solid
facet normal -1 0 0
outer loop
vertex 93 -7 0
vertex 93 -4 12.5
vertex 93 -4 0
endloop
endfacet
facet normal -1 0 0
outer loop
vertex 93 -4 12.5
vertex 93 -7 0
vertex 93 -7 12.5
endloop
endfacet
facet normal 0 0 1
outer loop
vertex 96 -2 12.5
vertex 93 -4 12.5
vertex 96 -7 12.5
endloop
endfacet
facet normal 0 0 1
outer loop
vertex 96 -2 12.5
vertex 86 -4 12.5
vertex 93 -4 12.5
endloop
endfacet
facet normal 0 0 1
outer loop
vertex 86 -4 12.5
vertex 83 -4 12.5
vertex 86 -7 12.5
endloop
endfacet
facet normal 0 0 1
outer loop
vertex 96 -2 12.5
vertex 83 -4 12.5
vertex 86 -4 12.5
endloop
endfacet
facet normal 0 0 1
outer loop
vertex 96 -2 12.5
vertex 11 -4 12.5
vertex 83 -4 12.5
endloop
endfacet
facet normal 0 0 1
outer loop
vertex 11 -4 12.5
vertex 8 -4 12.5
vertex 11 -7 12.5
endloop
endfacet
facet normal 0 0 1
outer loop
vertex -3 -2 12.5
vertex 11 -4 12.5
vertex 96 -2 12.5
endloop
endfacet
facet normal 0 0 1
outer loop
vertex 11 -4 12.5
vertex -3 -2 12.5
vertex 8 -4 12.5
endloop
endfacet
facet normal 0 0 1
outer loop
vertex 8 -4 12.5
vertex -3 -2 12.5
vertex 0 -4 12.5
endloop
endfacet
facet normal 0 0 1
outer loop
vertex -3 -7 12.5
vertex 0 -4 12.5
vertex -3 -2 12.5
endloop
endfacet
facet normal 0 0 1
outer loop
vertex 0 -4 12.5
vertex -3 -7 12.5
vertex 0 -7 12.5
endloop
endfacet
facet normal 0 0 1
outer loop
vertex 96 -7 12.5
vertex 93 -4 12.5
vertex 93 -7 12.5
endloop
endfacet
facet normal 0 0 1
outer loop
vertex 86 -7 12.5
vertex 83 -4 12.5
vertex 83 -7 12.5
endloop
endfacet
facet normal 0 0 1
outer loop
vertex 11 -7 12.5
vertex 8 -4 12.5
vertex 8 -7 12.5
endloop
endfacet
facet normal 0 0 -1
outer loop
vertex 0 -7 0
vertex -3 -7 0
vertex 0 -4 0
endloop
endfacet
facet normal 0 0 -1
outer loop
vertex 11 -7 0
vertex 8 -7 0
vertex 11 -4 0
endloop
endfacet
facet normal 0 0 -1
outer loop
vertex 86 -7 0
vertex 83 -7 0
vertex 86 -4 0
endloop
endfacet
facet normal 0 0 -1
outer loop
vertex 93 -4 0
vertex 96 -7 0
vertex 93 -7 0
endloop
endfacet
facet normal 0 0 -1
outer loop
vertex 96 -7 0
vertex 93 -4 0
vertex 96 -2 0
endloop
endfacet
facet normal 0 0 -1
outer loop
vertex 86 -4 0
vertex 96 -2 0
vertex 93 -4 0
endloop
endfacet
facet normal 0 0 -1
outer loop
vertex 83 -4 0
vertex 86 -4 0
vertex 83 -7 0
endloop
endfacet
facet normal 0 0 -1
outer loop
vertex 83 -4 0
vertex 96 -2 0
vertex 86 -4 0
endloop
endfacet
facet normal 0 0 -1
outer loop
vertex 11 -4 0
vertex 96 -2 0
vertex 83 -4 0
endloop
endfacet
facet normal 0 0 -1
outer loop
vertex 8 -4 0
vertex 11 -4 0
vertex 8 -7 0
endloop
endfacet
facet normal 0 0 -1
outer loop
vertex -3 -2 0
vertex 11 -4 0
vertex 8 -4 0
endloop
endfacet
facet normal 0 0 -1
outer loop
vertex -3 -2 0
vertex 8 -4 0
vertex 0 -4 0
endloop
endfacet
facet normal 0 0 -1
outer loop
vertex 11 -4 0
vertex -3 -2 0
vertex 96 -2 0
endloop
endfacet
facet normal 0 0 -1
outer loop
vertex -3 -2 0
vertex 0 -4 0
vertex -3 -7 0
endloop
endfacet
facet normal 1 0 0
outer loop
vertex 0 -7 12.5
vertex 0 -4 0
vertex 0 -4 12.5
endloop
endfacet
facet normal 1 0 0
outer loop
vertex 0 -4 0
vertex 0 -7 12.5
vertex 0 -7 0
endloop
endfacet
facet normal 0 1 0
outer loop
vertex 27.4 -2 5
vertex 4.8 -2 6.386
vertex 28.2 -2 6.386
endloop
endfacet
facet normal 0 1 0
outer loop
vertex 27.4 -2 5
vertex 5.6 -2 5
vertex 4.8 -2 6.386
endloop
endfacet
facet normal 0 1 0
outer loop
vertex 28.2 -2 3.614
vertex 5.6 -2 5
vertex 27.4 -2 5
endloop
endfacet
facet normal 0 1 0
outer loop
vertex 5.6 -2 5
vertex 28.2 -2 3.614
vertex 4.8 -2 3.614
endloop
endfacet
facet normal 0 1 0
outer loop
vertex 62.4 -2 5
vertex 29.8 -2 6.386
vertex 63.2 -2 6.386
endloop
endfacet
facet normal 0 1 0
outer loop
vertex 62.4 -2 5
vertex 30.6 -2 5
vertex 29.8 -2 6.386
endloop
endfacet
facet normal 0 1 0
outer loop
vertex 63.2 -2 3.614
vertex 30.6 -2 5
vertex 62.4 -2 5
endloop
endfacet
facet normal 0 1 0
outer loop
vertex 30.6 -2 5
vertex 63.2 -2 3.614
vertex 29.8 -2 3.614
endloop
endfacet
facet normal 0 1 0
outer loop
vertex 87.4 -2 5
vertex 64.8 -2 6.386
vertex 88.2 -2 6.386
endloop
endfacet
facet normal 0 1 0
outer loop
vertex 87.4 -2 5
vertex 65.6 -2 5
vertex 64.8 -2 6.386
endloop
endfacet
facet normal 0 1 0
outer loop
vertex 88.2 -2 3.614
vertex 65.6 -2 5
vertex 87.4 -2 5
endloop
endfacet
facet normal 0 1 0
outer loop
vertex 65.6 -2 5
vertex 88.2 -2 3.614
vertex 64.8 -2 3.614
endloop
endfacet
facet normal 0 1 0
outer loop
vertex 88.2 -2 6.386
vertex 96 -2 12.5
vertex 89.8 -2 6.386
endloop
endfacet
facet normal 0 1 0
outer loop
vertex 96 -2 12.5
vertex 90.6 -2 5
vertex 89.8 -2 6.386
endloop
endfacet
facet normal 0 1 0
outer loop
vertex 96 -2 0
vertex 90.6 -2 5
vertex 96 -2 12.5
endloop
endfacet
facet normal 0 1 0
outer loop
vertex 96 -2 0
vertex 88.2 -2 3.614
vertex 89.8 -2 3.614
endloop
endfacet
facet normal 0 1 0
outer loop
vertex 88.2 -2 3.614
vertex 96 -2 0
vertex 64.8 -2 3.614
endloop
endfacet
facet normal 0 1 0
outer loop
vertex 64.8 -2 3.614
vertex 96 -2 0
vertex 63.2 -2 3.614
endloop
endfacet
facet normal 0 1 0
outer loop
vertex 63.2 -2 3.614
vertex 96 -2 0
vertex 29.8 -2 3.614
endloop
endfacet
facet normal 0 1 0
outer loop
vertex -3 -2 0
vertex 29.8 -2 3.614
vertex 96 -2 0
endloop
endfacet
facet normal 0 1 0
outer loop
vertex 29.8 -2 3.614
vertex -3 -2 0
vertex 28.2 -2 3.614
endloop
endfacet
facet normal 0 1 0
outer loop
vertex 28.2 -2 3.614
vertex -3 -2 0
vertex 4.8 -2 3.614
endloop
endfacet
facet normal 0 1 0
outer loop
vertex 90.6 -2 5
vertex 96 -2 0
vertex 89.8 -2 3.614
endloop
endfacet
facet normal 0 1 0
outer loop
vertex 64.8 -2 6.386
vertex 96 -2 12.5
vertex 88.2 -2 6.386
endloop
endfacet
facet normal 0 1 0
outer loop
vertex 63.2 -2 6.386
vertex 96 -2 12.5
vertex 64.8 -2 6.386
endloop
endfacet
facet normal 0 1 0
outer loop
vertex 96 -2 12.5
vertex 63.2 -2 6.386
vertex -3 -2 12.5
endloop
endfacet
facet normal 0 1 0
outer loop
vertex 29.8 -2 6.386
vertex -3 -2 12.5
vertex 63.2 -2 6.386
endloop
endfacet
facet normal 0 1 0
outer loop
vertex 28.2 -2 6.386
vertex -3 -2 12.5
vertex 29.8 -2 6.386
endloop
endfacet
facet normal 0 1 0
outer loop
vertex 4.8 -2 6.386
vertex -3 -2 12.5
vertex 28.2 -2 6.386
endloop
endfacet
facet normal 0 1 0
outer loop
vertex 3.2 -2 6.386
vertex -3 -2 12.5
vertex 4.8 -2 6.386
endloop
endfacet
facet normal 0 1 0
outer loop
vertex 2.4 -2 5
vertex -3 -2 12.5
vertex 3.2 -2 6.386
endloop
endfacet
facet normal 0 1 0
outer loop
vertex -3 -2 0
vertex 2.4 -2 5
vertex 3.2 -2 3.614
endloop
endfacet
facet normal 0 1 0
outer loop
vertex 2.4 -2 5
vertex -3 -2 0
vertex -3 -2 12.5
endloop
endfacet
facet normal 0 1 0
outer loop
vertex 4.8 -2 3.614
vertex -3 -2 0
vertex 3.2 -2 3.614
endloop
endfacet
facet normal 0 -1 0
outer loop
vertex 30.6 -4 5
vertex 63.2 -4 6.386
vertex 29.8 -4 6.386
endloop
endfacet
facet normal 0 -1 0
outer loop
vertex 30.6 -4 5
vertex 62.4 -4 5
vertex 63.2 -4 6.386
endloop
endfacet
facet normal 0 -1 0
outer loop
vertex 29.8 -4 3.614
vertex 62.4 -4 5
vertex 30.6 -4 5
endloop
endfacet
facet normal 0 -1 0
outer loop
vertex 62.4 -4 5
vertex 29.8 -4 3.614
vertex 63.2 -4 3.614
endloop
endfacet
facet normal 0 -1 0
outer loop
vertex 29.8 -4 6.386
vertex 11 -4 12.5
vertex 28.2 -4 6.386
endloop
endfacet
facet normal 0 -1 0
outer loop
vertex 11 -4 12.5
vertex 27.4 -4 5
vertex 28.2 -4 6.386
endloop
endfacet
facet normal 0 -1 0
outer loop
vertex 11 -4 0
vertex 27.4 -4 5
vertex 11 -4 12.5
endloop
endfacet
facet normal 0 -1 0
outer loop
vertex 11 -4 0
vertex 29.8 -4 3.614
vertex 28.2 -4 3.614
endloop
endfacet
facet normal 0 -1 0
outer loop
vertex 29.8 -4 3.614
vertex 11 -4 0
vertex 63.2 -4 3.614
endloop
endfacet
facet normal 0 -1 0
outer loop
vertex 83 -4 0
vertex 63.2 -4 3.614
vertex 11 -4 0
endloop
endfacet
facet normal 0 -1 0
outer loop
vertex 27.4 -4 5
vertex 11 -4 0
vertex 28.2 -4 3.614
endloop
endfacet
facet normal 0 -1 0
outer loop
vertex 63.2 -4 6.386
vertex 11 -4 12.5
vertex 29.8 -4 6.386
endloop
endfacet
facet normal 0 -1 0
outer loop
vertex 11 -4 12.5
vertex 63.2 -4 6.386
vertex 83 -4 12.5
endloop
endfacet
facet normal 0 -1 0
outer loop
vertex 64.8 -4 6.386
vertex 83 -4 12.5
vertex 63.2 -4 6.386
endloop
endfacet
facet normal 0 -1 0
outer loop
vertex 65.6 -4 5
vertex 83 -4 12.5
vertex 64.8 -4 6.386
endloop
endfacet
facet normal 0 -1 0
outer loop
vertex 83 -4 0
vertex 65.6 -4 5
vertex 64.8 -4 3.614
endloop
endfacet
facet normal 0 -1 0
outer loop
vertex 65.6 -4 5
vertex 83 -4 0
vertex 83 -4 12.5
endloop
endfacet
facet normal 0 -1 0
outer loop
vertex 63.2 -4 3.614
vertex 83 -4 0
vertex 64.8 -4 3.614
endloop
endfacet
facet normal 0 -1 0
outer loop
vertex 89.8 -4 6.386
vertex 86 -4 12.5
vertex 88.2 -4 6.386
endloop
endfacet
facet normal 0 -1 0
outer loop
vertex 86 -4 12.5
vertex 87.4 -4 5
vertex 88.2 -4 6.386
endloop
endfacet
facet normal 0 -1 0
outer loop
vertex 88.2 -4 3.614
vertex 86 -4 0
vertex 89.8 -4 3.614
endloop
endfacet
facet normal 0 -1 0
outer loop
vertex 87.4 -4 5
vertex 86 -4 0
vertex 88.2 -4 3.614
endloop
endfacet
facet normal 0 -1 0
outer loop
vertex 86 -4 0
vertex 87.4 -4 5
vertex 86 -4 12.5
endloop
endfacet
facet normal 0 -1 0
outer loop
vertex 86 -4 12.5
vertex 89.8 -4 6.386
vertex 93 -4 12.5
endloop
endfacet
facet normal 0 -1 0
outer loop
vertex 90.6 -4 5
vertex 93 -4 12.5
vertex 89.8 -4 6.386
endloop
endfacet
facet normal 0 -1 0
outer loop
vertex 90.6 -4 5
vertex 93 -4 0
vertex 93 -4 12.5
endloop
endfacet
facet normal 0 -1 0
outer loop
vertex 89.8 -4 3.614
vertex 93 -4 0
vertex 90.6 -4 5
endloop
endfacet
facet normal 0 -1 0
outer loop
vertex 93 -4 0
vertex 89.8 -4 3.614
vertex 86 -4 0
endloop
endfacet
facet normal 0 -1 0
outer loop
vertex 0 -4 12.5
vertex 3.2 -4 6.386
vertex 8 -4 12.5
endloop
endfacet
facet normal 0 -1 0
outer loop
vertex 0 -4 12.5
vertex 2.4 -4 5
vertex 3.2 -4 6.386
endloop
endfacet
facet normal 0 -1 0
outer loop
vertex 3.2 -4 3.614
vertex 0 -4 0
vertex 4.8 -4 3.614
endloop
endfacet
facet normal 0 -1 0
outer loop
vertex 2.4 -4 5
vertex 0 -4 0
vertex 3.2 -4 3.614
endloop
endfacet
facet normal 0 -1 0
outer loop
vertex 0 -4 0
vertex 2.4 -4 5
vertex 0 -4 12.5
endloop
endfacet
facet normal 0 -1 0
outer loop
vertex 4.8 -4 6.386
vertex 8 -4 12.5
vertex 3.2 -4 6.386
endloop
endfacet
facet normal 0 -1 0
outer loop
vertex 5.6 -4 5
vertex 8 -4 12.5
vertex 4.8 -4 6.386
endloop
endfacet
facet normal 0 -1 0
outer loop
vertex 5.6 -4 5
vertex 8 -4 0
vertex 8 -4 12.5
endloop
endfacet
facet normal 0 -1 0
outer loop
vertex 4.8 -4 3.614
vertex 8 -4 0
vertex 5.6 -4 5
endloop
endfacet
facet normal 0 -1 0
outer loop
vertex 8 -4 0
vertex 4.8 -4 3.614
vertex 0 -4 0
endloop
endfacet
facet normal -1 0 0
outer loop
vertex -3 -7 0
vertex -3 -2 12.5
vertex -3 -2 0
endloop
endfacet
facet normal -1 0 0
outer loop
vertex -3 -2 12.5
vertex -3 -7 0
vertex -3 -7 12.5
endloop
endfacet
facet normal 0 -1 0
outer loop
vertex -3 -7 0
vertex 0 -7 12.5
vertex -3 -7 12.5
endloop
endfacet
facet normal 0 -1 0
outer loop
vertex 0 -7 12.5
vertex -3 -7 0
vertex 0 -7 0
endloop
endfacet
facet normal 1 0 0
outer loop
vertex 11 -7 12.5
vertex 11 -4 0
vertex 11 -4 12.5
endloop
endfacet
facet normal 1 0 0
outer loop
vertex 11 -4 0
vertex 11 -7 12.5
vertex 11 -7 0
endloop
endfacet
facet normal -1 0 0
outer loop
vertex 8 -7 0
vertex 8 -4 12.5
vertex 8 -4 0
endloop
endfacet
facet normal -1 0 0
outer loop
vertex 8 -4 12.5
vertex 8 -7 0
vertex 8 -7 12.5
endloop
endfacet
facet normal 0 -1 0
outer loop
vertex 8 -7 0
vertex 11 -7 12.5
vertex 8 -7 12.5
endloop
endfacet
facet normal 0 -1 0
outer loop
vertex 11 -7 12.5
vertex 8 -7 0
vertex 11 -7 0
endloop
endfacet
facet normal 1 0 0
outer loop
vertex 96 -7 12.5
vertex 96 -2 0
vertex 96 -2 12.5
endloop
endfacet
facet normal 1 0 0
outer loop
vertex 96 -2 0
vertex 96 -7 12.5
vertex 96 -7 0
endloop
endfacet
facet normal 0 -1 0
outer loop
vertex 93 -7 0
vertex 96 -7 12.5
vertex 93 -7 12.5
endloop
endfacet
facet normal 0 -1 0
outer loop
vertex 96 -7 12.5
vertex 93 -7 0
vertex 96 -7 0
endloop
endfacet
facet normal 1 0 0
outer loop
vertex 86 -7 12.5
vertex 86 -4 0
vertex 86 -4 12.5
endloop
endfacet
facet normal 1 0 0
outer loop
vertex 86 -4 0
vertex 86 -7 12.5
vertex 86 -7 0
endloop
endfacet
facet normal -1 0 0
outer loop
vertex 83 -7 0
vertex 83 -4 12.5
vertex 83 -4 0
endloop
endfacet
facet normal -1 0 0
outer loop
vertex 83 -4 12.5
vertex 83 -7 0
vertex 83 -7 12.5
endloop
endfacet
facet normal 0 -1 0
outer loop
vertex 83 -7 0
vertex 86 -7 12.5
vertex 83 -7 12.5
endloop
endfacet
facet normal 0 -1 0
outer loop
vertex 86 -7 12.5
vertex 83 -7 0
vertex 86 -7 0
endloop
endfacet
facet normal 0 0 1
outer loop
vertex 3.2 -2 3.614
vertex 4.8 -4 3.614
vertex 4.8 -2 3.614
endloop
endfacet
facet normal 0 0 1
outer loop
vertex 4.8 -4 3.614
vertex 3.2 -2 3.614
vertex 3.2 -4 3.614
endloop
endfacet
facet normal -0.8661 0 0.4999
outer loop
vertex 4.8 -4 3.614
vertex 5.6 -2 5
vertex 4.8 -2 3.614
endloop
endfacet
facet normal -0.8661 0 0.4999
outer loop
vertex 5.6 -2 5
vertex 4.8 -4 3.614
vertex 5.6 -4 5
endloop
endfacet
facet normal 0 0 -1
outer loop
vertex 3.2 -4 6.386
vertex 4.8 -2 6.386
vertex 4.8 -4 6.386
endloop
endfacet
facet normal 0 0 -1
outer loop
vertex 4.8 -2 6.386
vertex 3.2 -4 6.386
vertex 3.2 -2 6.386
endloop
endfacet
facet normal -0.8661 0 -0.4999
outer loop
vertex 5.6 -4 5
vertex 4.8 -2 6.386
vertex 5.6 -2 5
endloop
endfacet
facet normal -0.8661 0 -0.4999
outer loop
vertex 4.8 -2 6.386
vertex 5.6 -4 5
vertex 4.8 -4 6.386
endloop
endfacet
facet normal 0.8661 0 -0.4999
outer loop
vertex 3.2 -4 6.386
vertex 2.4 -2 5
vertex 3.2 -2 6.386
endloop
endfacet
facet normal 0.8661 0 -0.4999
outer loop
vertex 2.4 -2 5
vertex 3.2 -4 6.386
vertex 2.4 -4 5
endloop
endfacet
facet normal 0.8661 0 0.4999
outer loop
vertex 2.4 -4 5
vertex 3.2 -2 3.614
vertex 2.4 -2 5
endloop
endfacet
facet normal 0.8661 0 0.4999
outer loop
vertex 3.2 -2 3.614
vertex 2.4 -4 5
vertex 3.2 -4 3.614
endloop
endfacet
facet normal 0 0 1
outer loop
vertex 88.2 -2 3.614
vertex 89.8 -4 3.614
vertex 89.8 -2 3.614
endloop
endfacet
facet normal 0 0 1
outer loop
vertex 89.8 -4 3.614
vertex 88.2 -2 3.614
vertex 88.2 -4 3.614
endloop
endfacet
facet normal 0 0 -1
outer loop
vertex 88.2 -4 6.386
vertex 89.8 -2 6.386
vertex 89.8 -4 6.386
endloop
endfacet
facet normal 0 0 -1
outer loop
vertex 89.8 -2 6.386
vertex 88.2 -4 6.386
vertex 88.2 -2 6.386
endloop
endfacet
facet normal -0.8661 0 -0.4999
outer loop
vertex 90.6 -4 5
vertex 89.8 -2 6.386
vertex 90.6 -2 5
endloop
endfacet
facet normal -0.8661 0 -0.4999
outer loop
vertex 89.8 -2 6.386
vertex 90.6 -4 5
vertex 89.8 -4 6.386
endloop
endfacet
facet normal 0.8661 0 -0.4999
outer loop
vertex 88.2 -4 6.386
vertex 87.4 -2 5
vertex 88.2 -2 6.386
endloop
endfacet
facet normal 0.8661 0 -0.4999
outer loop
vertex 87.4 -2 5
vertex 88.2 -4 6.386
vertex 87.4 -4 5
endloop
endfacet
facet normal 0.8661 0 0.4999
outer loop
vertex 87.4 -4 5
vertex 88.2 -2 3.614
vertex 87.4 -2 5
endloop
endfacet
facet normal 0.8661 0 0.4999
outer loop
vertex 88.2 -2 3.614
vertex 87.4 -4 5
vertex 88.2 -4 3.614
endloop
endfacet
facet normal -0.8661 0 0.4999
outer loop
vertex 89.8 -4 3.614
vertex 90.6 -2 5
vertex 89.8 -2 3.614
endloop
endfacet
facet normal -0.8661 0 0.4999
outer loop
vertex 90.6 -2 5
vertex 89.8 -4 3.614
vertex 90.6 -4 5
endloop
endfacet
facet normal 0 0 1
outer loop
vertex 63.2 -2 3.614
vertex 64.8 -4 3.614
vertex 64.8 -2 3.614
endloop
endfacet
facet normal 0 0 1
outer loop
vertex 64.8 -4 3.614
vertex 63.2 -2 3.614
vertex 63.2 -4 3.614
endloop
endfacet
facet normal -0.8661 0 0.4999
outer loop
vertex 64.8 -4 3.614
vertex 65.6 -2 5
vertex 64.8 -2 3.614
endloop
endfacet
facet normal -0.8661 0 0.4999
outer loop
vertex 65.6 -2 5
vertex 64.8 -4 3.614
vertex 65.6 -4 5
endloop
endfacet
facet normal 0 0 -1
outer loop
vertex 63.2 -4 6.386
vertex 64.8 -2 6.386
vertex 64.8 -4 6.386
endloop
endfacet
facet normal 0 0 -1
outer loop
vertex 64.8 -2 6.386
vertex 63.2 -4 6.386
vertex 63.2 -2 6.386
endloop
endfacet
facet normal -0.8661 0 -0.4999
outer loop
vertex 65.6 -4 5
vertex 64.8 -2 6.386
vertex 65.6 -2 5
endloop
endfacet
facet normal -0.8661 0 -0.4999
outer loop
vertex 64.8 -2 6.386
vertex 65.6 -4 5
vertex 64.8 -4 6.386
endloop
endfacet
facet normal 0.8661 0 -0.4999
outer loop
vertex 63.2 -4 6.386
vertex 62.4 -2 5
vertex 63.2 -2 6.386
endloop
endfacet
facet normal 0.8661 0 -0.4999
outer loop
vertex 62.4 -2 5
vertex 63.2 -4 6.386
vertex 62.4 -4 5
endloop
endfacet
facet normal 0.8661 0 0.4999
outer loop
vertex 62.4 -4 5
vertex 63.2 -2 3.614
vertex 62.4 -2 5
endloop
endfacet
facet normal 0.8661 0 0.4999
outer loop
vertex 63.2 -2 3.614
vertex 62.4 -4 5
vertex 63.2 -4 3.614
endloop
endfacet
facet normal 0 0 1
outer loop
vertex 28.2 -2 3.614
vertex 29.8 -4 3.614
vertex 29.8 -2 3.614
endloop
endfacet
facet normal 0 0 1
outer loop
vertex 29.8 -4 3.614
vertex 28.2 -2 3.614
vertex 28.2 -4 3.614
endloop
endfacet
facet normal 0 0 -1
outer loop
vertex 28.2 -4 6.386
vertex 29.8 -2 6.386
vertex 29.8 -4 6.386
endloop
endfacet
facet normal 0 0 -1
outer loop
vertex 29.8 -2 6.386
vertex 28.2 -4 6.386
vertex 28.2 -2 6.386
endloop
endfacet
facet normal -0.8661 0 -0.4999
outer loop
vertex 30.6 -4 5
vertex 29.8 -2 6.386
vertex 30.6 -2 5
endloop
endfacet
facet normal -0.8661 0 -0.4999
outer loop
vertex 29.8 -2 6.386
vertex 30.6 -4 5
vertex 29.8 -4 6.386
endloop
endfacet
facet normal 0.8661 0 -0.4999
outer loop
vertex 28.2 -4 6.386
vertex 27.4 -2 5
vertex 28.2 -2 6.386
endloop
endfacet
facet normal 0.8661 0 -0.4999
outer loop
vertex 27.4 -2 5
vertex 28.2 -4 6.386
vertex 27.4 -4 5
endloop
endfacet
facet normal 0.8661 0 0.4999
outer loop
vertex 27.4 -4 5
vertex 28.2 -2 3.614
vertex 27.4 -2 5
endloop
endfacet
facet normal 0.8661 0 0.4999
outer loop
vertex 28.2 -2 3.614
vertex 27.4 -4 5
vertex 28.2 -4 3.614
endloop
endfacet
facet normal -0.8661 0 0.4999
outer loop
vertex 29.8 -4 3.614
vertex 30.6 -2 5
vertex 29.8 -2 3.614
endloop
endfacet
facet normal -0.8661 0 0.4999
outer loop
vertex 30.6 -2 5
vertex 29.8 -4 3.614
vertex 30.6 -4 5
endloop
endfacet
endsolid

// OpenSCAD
// file: vars.scad
SIDE_WIDTH = 8;
RESERVE_V = 10;
RESERVE_H = 15;
RESERVE_R = 0.5;
OUTER_R = 100;
INNER_R = 25;
SPOOL_WIDTH = 70;
AXIS_R = 5;
// main file
include <vars.scad>

module connector()
{
    translate([0,-65,5])
    difference()
    {
        union()
        {
            translate([0,38+23,-5])
                cube(size = [SIDE_WIDTH + SPOOL_WIDTH + RESERVE_H,2,12.5]);
    
            translate([-3,38+20,-5])
                cube(size = [3,5,12.5]);    
            translate([SIDE_WIDTH, 38+20,-5])
                cube(size = [3,3,12.5]);
    
            translate([SIDE_WIDTH + SPOOL_WIDTH + RESERVE_H,38+20,-5])
                cube(size = [3,5,12.5]);       
            translate([SPOOL_WIDTH + RESERVE_H - 2, 38+20,-5])    
                cube(size = [3,3,12.5]);
        }
        
        translate([SIDE_WIDTH/2,65,0])
        rotate([90,0,0])
            cylinder(h = 10, r = 1.6);
    
        translate([SIDE_WIDTH/2 + SPOOL_WIDTH + RESERVE_H,65,0])               
            rotate([90,0,0])
            cylinder(h = 10, r = 1.6);
        
         translate([SIDE_WIDTH/2 + SPOOL_WIDTH/2 + 10 + RESERVE_H,65,0])
            rotate([90,0,0])
            cylinder(h = 10, r = 1.6);
        
        translate([SIDE_WIDTH/2 + SPOOL_WIDTH/2 - 25 + RESERVE_H,65,0])
            rotate([90,0,0])
            cylinder(h = 10, r = 1.6);
    }
}

connector();
